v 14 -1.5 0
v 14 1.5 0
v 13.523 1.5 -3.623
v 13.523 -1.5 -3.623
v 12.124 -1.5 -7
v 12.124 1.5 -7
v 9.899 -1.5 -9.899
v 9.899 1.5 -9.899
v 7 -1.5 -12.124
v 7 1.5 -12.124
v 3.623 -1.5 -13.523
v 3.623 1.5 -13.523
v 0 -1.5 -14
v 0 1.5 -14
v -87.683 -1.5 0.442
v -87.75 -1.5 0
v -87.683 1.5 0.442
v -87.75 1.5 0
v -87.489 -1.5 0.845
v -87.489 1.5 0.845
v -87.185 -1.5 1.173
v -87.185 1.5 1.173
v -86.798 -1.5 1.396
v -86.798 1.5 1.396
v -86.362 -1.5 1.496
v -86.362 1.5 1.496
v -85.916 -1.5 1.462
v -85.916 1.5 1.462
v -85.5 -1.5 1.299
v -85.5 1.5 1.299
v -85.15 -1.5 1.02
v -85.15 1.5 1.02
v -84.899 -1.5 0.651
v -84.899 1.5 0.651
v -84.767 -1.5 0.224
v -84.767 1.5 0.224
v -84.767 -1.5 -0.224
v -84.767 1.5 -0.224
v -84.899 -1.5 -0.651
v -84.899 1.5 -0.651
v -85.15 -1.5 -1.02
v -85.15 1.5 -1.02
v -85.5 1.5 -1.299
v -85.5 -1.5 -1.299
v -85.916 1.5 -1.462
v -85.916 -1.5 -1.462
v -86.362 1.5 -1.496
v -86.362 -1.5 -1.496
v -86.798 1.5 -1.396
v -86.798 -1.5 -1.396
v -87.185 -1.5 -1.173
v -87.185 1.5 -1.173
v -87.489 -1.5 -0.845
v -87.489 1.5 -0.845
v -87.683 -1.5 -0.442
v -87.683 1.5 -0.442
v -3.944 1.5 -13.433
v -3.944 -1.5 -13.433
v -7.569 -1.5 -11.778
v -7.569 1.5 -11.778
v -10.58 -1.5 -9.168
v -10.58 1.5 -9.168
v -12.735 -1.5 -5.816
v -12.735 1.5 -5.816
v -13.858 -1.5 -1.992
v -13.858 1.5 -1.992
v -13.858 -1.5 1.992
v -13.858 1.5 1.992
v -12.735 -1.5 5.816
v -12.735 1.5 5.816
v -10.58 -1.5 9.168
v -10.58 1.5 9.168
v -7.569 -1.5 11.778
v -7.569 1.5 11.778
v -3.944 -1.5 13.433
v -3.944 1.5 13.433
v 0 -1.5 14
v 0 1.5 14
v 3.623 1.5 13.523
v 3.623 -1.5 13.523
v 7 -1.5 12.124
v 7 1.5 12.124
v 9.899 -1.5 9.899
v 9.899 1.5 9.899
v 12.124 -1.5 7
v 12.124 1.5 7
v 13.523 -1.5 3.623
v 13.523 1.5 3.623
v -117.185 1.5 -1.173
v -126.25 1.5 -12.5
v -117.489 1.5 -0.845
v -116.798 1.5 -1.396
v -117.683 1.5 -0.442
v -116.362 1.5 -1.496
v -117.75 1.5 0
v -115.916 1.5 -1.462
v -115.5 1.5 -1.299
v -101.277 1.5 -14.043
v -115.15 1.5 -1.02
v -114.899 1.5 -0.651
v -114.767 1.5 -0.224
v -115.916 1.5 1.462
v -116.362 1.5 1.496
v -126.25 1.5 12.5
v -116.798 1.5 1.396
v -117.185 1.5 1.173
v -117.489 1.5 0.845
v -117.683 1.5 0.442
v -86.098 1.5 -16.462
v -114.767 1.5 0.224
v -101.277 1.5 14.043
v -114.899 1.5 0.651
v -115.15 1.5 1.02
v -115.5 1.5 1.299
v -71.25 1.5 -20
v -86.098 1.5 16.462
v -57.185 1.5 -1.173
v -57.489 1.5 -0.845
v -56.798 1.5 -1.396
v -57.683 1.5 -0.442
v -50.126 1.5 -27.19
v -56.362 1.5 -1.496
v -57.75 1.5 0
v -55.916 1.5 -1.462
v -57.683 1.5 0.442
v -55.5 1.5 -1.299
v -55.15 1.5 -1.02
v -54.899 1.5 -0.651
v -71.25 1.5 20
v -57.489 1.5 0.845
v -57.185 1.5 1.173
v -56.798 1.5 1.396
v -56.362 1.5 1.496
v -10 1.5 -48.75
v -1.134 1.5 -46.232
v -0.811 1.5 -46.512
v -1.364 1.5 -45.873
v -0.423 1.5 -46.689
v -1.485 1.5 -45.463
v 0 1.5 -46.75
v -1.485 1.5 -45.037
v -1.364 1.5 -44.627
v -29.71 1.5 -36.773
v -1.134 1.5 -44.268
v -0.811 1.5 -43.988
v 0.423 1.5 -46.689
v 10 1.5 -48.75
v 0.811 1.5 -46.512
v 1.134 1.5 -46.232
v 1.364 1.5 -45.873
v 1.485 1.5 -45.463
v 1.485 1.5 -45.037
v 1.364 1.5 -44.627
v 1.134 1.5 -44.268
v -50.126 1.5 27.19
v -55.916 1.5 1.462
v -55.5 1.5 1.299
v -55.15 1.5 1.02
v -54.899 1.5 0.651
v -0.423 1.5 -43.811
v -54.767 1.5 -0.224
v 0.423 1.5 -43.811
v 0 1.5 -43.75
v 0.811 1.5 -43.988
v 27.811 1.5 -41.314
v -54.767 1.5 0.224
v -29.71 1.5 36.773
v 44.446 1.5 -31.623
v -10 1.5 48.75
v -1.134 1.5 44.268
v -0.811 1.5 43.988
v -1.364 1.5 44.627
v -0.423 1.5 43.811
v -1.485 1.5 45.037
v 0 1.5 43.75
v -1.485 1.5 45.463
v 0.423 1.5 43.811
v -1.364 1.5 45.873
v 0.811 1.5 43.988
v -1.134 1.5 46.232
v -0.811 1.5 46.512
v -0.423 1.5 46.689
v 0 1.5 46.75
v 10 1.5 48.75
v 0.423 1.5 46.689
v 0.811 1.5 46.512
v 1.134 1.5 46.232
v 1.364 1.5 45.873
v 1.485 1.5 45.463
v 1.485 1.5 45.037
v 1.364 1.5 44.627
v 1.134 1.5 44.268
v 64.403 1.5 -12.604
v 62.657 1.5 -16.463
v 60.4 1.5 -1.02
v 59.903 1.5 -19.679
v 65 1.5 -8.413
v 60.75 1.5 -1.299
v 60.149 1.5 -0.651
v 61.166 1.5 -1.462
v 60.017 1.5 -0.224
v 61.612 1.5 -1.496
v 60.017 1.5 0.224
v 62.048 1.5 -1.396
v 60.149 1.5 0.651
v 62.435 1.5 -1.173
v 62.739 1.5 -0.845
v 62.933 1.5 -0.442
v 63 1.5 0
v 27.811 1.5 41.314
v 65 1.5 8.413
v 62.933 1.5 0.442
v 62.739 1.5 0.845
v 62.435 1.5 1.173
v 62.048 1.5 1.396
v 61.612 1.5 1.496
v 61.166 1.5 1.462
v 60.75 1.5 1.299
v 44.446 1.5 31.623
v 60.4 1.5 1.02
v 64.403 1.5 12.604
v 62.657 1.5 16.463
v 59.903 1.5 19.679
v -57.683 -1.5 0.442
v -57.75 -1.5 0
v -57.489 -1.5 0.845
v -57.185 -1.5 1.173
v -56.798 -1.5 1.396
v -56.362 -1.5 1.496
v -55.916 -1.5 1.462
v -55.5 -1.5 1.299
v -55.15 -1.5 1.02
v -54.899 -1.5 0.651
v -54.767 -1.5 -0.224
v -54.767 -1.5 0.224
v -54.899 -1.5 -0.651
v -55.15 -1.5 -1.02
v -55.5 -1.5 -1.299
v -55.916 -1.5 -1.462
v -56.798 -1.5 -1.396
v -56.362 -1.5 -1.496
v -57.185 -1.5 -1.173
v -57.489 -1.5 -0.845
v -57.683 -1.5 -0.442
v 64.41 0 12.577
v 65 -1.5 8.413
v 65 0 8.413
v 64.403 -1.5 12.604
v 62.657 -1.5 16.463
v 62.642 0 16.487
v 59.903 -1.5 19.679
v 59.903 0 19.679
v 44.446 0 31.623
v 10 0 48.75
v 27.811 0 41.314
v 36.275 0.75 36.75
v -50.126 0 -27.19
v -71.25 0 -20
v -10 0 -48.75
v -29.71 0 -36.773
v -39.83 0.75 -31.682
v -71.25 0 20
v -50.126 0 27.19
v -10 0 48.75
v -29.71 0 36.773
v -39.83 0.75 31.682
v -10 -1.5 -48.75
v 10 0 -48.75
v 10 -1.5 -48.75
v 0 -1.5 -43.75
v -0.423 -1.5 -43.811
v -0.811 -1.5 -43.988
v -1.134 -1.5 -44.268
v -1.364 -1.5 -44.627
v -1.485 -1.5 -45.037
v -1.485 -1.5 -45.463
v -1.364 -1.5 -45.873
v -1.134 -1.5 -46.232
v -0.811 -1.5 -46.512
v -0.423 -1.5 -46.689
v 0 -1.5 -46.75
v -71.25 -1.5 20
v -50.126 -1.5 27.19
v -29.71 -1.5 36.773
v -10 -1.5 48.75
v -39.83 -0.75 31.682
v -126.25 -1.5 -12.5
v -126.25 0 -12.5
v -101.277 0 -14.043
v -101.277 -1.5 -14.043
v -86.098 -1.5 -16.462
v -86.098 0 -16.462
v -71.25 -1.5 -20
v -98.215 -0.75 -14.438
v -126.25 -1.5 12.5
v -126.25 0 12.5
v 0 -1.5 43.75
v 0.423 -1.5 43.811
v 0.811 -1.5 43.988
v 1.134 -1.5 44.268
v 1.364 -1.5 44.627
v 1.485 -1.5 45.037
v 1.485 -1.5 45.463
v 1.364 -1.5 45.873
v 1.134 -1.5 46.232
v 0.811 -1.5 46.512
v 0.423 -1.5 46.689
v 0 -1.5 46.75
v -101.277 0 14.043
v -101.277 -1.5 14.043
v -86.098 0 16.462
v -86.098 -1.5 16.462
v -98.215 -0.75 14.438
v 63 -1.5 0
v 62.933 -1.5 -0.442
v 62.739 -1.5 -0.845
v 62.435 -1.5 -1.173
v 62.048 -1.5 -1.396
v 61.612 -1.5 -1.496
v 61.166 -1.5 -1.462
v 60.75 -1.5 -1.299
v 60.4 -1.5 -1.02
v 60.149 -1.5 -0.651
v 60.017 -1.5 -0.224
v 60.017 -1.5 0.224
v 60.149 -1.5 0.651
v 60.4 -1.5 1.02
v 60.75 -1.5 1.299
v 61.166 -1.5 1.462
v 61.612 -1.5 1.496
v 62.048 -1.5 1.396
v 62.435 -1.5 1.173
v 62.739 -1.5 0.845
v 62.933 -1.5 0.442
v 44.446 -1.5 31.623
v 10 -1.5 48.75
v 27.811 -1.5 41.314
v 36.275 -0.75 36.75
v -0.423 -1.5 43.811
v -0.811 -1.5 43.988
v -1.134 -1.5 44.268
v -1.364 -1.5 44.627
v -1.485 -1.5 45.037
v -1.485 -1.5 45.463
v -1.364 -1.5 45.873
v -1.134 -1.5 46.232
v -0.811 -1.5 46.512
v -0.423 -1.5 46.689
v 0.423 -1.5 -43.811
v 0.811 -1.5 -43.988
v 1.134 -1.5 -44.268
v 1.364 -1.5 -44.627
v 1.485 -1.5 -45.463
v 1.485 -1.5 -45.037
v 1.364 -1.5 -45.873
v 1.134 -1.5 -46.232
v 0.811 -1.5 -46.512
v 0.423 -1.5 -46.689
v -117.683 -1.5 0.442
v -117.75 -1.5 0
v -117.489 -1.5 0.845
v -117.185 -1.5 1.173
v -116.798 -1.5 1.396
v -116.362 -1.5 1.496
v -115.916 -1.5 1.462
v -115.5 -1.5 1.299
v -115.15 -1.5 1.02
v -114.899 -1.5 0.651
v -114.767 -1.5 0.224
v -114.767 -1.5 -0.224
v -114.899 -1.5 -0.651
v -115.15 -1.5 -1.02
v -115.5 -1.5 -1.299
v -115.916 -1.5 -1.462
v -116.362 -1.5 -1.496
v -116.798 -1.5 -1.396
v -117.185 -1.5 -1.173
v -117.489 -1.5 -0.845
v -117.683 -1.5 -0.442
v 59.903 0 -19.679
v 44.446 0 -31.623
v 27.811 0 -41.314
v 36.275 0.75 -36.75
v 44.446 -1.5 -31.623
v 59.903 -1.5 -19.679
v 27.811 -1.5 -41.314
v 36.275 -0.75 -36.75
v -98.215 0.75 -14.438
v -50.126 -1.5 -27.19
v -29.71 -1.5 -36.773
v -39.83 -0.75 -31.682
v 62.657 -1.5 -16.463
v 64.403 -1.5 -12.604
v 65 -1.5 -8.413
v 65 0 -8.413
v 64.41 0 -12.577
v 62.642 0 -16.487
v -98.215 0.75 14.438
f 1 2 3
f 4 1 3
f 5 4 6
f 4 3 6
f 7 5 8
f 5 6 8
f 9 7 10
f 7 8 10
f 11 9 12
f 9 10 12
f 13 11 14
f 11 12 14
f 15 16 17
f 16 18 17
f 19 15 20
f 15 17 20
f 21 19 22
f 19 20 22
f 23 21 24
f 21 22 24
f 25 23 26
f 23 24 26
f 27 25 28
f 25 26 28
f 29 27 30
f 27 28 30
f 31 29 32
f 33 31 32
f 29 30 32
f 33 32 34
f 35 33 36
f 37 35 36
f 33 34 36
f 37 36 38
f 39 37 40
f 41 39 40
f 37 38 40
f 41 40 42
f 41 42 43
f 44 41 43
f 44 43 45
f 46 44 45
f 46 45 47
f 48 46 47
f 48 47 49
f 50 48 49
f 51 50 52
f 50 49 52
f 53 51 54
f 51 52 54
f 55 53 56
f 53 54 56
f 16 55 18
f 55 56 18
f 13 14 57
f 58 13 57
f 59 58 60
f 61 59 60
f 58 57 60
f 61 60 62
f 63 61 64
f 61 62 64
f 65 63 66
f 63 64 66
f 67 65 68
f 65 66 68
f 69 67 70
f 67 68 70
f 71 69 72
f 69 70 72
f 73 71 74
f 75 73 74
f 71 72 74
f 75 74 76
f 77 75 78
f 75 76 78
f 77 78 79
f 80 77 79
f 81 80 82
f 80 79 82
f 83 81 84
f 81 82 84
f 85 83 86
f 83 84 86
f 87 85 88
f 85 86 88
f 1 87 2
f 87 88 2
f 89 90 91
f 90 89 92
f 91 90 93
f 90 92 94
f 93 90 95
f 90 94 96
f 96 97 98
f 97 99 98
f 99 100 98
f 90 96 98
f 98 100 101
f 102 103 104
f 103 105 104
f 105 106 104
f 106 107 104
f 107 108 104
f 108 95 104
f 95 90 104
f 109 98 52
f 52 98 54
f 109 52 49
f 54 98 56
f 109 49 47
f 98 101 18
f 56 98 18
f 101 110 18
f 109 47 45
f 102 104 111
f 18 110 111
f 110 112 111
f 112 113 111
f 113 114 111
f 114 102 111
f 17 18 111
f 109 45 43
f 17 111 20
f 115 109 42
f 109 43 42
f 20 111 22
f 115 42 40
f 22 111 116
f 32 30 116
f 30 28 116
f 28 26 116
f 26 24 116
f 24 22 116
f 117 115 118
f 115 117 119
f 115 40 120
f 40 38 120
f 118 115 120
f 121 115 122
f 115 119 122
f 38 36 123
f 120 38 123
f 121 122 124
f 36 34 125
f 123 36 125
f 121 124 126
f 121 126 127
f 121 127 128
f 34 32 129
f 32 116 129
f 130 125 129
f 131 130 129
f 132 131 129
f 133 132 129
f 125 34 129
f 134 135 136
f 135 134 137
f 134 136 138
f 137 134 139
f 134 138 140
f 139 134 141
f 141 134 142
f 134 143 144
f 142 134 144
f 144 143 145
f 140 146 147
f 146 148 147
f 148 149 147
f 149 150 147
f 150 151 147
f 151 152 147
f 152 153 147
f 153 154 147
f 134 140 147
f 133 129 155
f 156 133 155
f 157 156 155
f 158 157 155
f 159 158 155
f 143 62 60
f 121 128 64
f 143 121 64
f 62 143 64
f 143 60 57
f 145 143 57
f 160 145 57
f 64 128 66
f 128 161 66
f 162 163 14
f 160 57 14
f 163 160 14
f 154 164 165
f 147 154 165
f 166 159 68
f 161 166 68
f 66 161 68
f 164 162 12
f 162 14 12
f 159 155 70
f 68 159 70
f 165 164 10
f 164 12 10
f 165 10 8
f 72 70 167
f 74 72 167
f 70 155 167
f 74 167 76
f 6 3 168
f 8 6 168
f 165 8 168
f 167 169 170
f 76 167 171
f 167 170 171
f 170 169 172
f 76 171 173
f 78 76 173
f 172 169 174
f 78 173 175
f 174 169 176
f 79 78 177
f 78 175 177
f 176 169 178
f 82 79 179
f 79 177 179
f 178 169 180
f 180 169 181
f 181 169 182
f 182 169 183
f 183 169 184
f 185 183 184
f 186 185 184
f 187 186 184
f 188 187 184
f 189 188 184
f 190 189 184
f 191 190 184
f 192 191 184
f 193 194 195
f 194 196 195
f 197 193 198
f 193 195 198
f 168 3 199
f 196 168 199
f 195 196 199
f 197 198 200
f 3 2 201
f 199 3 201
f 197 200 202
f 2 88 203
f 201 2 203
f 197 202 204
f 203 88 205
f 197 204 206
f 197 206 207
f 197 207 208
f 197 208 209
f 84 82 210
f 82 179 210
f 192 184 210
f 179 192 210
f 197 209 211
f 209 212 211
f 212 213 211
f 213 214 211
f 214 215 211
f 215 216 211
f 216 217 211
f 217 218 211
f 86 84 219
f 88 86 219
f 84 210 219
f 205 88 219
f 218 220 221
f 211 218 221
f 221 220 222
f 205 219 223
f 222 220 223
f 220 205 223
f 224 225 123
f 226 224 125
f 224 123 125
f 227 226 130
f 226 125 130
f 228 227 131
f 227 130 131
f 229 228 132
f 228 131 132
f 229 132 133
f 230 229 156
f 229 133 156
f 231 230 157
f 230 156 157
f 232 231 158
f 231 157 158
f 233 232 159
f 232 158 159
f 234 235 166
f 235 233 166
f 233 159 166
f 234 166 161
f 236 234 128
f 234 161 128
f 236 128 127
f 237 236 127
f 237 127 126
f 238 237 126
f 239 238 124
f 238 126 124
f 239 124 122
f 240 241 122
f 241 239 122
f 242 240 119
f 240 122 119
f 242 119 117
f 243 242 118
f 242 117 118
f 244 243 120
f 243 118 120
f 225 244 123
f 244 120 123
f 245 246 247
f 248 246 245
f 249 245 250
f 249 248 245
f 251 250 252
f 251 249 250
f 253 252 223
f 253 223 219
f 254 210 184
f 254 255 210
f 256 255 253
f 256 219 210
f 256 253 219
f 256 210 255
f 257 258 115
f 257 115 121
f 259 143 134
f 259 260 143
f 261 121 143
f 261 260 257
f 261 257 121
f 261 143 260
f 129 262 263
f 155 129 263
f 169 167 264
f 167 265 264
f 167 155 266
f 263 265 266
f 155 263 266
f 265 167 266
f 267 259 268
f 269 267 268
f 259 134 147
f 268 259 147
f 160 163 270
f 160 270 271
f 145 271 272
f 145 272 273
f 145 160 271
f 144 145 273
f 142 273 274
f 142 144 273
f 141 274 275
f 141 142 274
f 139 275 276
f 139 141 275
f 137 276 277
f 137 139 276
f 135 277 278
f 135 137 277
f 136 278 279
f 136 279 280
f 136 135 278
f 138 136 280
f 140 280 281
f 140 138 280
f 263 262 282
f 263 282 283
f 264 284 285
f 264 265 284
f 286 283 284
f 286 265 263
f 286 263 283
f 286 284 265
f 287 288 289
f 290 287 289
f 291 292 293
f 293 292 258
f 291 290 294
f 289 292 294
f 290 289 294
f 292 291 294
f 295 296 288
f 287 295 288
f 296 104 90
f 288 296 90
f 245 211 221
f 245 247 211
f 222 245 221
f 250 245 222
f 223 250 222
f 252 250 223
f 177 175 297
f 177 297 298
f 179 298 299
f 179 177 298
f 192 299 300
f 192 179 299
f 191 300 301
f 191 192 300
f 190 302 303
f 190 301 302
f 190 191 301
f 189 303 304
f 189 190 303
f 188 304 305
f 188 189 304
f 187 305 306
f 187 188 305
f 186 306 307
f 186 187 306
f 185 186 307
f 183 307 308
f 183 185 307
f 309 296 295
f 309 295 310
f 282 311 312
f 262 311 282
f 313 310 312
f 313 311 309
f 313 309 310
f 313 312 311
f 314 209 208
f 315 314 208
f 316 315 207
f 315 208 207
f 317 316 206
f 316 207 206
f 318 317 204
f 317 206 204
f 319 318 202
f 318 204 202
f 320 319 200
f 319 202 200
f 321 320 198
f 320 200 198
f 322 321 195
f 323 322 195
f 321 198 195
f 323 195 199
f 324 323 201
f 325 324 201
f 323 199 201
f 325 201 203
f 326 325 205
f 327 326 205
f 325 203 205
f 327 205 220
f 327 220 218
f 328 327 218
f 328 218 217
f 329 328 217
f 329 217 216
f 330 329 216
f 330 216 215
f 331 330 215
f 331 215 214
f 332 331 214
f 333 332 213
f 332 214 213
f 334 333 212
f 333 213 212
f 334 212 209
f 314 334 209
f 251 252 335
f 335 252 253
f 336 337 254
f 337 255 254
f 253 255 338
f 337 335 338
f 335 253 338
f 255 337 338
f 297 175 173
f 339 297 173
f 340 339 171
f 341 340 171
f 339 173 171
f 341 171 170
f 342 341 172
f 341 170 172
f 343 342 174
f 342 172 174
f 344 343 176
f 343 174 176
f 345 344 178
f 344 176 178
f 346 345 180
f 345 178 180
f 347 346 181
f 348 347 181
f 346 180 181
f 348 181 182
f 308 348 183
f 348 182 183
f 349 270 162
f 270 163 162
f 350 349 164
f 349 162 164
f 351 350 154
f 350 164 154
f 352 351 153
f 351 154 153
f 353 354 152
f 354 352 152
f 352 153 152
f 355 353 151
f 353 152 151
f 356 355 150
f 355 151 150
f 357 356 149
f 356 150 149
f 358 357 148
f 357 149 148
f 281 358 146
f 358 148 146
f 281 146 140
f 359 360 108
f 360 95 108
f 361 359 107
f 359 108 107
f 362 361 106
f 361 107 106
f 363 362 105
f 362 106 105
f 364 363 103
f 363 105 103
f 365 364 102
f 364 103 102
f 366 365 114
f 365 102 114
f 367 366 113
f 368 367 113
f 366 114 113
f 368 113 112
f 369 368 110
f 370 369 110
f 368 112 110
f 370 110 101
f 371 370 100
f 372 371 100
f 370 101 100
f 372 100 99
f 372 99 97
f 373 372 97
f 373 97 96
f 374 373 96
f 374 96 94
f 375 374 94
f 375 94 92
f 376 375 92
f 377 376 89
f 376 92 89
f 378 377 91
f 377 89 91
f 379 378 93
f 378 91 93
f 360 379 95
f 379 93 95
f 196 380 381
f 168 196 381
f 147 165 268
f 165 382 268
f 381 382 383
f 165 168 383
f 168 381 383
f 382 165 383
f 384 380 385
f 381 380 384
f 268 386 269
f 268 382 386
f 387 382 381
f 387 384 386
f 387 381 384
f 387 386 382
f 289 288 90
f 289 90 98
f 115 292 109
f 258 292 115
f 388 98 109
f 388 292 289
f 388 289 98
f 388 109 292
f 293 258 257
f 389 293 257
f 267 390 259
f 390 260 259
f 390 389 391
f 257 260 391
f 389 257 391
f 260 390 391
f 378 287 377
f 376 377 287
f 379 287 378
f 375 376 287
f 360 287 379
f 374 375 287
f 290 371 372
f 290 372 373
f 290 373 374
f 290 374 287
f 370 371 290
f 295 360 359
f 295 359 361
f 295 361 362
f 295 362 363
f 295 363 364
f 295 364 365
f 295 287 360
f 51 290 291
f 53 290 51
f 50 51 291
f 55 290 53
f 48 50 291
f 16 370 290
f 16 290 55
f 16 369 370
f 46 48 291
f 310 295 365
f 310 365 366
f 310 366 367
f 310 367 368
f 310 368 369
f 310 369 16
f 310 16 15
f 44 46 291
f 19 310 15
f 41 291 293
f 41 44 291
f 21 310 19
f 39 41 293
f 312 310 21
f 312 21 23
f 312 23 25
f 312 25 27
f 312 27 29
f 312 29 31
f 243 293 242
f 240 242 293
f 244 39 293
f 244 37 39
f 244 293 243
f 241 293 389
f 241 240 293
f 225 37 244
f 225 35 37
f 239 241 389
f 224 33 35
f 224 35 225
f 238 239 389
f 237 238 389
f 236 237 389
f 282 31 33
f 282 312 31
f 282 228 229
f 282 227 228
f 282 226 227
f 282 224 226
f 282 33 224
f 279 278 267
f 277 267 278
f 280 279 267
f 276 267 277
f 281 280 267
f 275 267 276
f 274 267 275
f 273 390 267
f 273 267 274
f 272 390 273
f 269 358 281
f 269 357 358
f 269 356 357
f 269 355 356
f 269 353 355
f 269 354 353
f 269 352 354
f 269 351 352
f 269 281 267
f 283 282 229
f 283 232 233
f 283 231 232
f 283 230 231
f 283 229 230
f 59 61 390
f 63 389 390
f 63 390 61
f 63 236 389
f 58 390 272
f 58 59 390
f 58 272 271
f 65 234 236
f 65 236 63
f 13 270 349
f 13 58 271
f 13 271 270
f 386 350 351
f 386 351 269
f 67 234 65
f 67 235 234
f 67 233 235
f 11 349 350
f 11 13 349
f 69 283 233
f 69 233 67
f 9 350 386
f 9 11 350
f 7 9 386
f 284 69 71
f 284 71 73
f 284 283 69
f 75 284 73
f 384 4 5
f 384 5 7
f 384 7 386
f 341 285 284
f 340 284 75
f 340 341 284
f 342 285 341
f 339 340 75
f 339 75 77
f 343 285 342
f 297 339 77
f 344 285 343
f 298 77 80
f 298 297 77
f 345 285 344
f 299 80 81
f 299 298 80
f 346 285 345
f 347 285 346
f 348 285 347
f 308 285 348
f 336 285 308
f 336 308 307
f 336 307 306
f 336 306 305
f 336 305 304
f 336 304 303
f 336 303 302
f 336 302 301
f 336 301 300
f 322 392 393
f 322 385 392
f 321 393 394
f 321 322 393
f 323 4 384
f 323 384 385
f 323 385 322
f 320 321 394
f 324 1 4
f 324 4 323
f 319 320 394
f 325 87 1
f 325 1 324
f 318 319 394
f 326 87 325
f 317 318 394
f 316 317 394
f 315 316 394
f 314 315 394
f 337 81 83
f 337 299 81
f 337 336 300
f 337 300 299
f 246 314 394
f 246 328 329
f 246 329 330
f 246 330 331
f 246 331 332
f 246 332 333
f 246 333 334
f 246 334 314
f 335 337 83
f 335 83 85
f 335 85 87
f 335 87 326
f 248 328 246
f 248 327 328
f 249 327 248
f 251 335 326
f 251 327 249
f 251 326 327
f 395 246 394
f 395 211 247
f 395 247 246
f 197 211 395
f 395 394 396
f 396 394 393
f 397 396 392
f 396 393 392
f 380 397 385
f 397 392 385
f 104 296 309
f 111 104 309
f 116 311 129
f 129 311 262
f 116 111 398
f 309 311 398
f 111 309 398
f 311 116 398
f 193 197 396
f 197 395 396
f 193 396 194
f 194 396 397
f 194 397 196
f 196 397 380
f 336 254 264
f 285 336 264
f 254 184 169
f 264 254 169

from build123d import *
from build123d.topology import SkipClean

# Parameters (mm, degrees)
BOSS_EXTRUDE1_DEPTH  = 1.5
SKETCH2_R            = 1.5
CUT_EXTRUDE1_DEPTH   = 82.305365895
FILLET1_R            = 15
FILLET1_OF_MIRROR2_R = 15
BOSS_EXTRUDE2_DEPTH  = 1.5
SKETCH4_R            = 14
CUT_EXTRUDE2_DEPTH   = 136.368478737


with BuildPart() as part:
    # Sketch1 → Boss-Extrude1 (new, symmetric)
    with BuildSketch(Plane(origin=(0, 0, 0), x_dir=(1, 0, 0), z_dir=(0, 1, 0))):
        with BuildLine():
            Line((0, 48.75), (0, 0))
            Line((0, 0), (65, 0))
            Line((65, 0), (65, 15))
            add(Edge.make_bspline(
                [(65, 15), (40.796135722, 38.189445994), (10, 48.75)],
                knots=[0, 0, 0, 1, 1, 1], degree=2))
            Line((10, 48.75), (0, 48.75))
        make_face()
    boss_extrude1 = extrude(amount=BOSS_EXTRUDE1_DEPTH, both=True)

    # Sketch2 → Cut-Extrude1 (cut, through all)
    with BuildSketch(Plane(origin=(0, 1.5, 0), x_dir=(1, 0, 0), z_dir=(0, 1, 0))):
        with Locations((0, 45.25)):
            Circle(SKETCH2_R)
        with Locations((61.5, 0)):
            Circle(SKETCH2_R)
    cut_extrude1 = extrude(amount=-CUT_EXTRUDE1_DEPTH, mode=Mode.SUBTRACT)

    # Fillet1
    fillet1_edges = [part.edges().sort_by_distance(p)[0] for p in [
        (65, 0.75, -15),
    ]]
    fillet(fillet1_edges, radius=FILLET1_R)

    # Mirror2: Boss-Extrude1, Cut-Extrude1 across plane
    with SkipClean():  # the faces are left unmerged after this step: merging them gives an invalid solid
        add(boss_extrude1.mirror(Plane.XY))
        add(cut_extrude1.mirror(Plane.XY), mode=Mode.SUBTRACT)

    # Fillet1 of Mirror2
    fillet1_of_mirror2_edges = [part.edges().sort_by_distance(p)[0] for p in [
        (65, 0.75, 15),
    ]]
    fillet(fillet1_of_mirror2_edges, radius=FILLET1_OF_MIRROR2_R)

    # Sketch3 → Boss-Extrude2 (add, symmetric)
    with BuildSketch(Plane(origin=(0, 0, 0), x_dir=(1, 0, 0), z_dir=(0, 1, 0))):
        with BuildLine():
            Line((0, 0), (0, 43.75))
            ThreePointArc((0, 43.75), (-1.5, 45.25), (0, 46.75))
            Line((0, 46.75), (0, 48.75))
            Line((0, 48.75), (-10, 48.75))
            add(Edge.make_bspline(
                [(-10, 48.75), (-62.853704869, 12.777917331), (-126.25, 12.5)],
                knots=[0.450666758, 0.450666758, 0.450666758, 1.450666758, 1.450666758, 1.450666758], degree=2))
            Line((-126.25, 12.5), (-126.25, 0))
            Line((-126.25, 0), (-117.75, 0))
            ThreePointArc((-117.75, 0), (-116.25, 1.5), (-114.75, 0))
            Line((-114.75, 0), (-87.75, 0))
            ThreePointArc((-87.75, 0), (-86.25, 1.5), (-84.75, 0))
            Line((-84.75, 0), (-57.75, 0))
            ThreePointArc((-57.75, 0), (-56.25, 1.5), (-54.75, 0))
            Line((-54.75, 0), (0, 0))
        make_face()
    boss_extrude2 = extrude(amount=BOSS_EXTRUDE2_DEPTH, both=True)

    # Mirror3: Boss-Extrude2 across plane
    with SkipClean():  # the faces are left unmerged after this step: merging them gives an invalid solid
        add(boss_extrude2.mirror(Plane.XY))

    # Sketch4 → Cut-Extrude2 (cut, through all)
    with BuildSketch(Plane(origin=(0, 1.5, 0), x_dir=(1, 0, 0), z_dir=(0, 1, 0))):
        Circle(SKETCH4_R)
    extrude(amount=-CUT_EXTRUDE2_DEPTH, mode=Mode.SUBTRACT)


solid = part.part
